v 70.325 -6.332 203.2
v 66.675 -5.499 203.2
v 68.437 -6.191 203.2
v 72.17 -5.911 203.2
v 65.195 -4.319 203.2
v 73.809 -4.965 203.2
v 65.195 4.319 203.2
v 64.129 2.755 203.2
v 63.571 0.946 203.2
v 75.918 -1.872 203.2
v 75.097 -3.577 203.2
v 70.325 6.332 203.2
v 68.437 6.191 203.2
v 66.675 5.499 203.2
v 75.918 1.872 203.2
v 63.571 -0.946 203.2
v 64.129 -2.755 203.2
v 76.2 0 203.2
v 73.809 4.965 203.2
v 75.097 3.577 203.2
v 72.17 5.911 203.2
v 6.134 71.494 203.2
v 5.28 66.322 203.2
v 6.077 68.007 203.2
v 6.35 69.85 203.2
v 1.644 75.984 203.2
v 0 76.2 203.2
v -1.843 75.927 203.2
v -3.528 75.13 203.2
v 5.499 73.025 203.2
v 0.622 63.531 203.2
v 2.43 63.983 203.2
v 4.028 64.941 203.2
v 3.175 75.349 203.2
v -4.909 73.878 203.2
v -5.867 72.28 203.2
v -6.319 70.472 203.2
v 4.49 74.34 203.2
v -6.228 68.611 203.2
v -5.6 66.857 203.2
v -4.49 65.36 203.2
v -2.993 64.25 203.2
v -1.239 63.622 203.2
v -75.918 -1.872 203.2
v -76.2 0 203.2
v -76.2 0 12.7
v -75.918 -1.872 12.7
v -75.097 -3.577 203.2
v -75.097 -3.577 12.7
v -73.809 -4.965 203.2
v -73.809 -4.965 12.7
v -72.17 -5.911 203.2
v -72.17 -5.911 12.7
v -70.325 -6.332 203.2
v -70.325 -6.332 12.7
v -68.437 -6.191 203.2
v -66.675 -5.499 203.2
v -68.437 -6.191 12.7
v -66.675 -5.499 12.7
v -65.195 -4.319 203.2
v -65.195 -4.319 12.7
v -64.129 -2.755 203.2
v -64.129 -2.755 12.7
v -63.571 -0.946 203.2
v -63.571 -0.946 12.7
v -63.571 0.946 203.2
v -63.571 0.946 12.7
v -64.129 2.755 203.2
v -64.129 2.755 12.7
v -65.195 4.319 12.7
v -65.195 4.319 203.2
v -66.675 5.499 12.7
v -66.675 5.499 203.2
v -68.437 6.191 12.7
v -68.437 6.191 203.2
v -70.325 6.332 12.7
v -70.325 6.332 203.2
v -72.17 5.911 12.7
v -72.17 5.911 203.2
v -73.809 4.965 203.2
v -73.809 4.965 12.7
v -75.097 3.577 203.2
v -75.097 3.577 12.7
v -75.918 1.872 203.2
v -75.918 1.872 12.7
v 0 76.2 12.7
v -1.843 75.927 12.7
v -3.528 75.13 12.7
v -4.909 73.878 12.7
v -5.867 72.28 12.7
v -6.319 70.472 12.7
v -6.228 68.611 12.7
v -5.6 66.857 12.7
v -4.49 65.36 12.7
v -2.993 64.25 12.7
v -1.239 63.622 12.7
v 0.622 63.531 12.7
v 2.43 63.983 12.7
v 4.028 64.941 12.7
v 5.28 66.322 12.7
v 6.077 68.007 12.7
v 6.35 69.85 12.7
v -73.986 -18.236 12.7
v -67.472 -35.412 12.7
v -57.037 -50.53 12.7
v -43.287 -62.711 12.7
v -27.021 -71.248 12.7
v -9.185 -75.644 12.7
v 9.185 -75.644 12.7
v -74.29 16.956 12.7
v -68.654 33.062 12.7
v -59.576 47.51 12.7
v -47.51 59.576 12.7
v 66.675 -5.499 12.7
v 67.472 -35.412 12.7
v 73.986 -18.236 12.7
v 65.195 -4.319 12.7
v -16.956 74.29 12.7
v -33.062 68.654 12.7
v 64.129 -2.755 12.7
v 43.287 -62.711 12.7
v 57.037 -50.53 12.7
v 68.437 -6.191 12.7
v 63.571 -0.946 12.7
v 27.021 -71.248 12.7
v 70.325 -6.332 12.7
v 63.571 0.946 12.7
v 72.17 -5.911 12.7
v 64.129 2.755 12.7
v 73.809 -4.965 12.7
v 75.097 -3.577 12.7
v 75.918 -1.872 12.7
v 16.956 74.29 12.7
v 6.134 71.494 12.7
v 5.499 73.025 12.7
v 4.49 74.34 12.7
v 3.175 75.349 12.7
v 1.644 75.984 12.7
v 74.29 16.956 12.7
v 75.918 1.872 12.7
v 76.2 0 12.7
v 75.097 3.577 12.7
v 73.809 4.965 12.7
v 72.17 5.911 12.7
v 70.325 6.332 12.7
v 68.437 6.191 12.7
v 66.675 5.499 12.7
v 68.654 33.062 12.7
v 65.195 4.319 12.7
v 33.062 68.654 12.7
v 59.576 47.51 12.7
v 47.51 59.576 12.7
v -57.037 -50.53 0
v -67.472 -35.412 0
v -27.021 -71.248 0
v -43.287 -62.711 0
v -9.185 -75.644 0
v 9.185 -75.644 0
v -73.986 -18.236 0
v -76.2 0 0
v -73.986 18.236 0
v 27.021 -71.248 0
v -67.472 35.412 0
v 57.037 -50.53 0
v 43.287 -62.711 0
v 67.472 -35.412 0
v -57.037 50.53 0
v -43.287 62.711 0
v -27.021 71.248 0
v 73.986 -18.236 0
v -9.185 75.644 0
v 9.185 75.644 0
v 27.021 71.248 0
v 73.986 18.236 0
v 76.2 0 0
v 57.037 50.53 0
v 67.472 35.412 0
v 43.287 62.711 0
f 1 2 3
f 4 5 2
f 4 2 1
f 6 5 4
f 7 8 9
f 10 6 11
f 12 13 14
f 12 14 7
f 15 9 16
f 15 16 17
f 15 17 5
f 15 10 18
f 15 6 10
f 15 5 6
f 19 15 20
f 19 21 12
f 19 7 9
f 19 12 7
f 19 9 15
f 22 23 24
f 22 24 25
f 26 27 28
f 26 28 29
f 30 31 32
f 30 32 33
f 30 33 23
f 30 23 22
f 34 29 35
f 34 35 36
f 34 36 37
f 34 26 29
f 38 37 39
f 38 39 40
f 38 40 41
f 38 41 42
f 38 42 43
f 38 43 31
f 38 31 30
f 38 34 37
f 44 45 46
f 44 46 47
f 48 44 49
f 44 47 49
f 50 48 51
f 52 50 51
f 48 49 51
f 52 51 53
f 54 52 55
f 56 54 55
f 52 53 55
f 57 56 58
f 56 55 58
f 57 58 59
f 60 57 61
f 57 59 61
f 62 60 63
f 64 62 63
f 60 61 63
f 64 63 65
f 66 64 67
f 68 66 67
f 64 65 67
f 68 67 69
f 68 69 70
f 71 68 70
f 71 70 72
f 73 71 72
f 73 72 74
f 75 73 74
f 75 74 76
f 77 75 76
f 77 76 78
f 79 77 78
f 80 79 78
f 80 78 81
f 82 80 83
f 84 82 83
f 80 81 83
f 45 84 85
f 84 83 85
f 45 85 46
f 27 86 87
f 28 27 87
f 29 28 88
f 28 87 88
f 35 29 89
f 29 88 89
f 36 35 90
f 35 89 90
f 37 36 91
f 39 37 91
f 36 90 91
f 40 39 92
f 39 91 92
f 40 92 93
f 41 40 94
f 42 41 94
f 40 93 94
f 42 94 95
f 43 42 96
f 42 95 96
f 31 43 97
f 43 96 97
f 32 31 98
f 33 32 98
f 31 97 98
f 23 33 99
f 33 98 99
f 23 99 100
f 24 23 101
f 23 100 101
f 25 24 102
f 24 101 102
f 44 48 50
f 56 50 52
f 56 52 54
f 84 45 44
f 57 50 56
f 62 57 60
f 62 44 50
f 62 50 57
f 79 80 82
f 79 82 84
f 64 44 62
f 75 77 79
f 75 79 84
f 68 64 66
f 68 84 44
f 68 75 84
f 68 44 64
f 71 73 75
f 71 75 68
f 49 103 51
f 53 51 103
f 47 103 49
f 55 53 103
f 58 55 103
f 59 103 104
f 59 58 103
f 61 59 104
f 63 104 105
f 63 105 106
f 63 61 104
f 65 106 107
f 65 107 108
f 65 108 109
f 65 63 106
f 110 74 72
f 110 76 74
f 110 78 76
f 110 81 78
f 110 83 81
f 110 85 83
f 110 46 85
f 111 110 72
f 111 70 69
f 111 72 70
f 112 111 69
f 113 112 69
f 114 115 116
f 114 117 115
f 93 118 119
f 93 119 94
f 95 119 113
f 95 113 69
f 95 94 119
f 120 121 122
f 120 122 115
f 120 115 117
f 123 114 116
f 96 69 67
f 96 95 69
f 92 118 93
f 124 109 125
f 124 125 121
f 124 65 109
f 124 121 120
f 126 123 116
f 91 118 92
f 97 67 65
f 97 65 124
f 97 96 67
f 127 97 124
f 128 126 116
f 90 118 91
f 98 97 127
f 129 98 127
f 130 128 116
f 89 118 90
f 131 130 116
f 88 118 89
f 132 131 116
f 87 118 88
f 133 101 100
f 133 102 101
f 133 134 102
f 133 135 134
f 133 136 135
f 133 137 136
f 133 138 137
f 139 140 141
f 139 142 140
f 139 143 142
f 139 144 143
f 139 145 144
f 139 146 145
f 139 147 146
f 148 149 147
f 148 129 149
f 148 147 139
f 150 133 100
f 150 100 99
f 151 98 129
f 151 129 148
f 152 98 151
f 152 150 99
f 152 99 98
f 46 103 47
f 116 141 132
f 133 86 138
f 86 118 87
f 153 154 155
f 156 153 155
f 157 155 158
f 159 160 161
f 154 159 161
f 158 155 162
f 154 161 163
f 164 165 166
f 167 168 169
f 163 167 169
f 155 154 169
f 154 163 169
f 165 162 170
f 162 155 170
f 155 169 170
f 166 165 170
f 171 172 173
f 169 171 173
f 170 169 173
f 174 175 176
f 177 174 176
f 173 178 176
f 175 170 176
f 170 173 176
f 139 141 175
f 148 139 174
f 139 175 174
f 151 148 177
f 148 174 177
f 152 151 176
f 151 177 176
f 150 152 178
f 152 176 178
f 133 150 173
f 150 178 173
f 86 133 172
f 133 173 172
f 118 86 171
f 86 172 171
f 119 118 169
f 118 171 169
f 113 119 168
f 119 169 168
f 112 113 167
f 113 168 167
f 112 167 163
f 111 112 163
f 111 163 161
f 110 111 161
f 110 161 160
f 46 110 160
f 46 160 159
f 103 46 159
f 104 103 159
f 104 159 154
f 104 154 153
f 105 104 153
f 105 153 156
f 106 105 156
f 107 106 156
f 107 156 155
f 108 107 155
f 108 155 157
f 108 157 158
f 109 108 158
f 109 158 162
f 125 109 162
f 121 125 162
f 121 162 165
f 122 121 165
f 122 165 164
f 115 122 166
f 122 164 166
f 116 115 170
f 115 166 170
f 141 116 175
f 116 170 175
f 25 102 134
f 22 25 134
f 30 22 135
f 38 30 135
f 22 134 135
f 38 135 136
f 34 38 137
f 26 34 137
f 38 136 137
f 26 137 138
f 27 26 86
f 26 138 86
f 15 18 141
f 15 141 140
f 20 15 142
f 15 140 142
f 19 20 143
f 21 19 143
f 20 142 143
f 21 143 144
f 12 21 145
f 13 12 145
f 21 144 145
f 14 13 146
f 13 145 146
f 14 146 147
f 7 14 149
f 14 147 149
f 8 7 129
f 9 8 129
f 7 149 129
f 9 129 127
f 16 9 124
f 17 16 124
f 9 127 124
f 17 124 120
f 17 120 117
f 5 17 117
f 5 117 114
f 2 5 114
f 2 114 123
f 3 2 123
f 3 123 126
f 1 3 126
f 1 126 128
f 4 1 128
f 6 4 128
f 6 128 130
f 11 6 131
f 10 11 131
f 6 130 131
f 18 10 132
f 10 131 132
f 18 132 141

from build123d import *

# Parameters (mm, degrees)
F0_R     = 76.2
F1_DEPTH = 12.7
F2_R     = 6.35
F3_DEPTH = 190.5


with BuildPart() as f1:
    # F0 (on Top) → F1 (new body)
    with BuildSketch(Plane.XY):
        Circle(F0_R)
    extrude(amount=F1_DEPTH)

    # F2 (on face) → F3 (join)
    with BuildSketch(Plane.XY.offset(12.7)):
        with BuildLine():
            ThreePointArc((-63.5, 0), (-69.85, 6.35), (-76.2, 0))
            ThreePointArc((-76.2, 0), (-69.85, -6.35), (-63.5, 0))
        make_face()
        with BuildLine():
            ThreePointArc((0, 76.2), (-4.490128, 65.359872), (6.35, 69.85))
            ThreePointArc((6.35, 69.85), (4.490128, 74.340128), (0, 76.2))
        make_face()
        with Locations((69.85, 0)):
            Circle(F2_R)
    extrude(amount=F3_DEPTH)


solid = f1.part
